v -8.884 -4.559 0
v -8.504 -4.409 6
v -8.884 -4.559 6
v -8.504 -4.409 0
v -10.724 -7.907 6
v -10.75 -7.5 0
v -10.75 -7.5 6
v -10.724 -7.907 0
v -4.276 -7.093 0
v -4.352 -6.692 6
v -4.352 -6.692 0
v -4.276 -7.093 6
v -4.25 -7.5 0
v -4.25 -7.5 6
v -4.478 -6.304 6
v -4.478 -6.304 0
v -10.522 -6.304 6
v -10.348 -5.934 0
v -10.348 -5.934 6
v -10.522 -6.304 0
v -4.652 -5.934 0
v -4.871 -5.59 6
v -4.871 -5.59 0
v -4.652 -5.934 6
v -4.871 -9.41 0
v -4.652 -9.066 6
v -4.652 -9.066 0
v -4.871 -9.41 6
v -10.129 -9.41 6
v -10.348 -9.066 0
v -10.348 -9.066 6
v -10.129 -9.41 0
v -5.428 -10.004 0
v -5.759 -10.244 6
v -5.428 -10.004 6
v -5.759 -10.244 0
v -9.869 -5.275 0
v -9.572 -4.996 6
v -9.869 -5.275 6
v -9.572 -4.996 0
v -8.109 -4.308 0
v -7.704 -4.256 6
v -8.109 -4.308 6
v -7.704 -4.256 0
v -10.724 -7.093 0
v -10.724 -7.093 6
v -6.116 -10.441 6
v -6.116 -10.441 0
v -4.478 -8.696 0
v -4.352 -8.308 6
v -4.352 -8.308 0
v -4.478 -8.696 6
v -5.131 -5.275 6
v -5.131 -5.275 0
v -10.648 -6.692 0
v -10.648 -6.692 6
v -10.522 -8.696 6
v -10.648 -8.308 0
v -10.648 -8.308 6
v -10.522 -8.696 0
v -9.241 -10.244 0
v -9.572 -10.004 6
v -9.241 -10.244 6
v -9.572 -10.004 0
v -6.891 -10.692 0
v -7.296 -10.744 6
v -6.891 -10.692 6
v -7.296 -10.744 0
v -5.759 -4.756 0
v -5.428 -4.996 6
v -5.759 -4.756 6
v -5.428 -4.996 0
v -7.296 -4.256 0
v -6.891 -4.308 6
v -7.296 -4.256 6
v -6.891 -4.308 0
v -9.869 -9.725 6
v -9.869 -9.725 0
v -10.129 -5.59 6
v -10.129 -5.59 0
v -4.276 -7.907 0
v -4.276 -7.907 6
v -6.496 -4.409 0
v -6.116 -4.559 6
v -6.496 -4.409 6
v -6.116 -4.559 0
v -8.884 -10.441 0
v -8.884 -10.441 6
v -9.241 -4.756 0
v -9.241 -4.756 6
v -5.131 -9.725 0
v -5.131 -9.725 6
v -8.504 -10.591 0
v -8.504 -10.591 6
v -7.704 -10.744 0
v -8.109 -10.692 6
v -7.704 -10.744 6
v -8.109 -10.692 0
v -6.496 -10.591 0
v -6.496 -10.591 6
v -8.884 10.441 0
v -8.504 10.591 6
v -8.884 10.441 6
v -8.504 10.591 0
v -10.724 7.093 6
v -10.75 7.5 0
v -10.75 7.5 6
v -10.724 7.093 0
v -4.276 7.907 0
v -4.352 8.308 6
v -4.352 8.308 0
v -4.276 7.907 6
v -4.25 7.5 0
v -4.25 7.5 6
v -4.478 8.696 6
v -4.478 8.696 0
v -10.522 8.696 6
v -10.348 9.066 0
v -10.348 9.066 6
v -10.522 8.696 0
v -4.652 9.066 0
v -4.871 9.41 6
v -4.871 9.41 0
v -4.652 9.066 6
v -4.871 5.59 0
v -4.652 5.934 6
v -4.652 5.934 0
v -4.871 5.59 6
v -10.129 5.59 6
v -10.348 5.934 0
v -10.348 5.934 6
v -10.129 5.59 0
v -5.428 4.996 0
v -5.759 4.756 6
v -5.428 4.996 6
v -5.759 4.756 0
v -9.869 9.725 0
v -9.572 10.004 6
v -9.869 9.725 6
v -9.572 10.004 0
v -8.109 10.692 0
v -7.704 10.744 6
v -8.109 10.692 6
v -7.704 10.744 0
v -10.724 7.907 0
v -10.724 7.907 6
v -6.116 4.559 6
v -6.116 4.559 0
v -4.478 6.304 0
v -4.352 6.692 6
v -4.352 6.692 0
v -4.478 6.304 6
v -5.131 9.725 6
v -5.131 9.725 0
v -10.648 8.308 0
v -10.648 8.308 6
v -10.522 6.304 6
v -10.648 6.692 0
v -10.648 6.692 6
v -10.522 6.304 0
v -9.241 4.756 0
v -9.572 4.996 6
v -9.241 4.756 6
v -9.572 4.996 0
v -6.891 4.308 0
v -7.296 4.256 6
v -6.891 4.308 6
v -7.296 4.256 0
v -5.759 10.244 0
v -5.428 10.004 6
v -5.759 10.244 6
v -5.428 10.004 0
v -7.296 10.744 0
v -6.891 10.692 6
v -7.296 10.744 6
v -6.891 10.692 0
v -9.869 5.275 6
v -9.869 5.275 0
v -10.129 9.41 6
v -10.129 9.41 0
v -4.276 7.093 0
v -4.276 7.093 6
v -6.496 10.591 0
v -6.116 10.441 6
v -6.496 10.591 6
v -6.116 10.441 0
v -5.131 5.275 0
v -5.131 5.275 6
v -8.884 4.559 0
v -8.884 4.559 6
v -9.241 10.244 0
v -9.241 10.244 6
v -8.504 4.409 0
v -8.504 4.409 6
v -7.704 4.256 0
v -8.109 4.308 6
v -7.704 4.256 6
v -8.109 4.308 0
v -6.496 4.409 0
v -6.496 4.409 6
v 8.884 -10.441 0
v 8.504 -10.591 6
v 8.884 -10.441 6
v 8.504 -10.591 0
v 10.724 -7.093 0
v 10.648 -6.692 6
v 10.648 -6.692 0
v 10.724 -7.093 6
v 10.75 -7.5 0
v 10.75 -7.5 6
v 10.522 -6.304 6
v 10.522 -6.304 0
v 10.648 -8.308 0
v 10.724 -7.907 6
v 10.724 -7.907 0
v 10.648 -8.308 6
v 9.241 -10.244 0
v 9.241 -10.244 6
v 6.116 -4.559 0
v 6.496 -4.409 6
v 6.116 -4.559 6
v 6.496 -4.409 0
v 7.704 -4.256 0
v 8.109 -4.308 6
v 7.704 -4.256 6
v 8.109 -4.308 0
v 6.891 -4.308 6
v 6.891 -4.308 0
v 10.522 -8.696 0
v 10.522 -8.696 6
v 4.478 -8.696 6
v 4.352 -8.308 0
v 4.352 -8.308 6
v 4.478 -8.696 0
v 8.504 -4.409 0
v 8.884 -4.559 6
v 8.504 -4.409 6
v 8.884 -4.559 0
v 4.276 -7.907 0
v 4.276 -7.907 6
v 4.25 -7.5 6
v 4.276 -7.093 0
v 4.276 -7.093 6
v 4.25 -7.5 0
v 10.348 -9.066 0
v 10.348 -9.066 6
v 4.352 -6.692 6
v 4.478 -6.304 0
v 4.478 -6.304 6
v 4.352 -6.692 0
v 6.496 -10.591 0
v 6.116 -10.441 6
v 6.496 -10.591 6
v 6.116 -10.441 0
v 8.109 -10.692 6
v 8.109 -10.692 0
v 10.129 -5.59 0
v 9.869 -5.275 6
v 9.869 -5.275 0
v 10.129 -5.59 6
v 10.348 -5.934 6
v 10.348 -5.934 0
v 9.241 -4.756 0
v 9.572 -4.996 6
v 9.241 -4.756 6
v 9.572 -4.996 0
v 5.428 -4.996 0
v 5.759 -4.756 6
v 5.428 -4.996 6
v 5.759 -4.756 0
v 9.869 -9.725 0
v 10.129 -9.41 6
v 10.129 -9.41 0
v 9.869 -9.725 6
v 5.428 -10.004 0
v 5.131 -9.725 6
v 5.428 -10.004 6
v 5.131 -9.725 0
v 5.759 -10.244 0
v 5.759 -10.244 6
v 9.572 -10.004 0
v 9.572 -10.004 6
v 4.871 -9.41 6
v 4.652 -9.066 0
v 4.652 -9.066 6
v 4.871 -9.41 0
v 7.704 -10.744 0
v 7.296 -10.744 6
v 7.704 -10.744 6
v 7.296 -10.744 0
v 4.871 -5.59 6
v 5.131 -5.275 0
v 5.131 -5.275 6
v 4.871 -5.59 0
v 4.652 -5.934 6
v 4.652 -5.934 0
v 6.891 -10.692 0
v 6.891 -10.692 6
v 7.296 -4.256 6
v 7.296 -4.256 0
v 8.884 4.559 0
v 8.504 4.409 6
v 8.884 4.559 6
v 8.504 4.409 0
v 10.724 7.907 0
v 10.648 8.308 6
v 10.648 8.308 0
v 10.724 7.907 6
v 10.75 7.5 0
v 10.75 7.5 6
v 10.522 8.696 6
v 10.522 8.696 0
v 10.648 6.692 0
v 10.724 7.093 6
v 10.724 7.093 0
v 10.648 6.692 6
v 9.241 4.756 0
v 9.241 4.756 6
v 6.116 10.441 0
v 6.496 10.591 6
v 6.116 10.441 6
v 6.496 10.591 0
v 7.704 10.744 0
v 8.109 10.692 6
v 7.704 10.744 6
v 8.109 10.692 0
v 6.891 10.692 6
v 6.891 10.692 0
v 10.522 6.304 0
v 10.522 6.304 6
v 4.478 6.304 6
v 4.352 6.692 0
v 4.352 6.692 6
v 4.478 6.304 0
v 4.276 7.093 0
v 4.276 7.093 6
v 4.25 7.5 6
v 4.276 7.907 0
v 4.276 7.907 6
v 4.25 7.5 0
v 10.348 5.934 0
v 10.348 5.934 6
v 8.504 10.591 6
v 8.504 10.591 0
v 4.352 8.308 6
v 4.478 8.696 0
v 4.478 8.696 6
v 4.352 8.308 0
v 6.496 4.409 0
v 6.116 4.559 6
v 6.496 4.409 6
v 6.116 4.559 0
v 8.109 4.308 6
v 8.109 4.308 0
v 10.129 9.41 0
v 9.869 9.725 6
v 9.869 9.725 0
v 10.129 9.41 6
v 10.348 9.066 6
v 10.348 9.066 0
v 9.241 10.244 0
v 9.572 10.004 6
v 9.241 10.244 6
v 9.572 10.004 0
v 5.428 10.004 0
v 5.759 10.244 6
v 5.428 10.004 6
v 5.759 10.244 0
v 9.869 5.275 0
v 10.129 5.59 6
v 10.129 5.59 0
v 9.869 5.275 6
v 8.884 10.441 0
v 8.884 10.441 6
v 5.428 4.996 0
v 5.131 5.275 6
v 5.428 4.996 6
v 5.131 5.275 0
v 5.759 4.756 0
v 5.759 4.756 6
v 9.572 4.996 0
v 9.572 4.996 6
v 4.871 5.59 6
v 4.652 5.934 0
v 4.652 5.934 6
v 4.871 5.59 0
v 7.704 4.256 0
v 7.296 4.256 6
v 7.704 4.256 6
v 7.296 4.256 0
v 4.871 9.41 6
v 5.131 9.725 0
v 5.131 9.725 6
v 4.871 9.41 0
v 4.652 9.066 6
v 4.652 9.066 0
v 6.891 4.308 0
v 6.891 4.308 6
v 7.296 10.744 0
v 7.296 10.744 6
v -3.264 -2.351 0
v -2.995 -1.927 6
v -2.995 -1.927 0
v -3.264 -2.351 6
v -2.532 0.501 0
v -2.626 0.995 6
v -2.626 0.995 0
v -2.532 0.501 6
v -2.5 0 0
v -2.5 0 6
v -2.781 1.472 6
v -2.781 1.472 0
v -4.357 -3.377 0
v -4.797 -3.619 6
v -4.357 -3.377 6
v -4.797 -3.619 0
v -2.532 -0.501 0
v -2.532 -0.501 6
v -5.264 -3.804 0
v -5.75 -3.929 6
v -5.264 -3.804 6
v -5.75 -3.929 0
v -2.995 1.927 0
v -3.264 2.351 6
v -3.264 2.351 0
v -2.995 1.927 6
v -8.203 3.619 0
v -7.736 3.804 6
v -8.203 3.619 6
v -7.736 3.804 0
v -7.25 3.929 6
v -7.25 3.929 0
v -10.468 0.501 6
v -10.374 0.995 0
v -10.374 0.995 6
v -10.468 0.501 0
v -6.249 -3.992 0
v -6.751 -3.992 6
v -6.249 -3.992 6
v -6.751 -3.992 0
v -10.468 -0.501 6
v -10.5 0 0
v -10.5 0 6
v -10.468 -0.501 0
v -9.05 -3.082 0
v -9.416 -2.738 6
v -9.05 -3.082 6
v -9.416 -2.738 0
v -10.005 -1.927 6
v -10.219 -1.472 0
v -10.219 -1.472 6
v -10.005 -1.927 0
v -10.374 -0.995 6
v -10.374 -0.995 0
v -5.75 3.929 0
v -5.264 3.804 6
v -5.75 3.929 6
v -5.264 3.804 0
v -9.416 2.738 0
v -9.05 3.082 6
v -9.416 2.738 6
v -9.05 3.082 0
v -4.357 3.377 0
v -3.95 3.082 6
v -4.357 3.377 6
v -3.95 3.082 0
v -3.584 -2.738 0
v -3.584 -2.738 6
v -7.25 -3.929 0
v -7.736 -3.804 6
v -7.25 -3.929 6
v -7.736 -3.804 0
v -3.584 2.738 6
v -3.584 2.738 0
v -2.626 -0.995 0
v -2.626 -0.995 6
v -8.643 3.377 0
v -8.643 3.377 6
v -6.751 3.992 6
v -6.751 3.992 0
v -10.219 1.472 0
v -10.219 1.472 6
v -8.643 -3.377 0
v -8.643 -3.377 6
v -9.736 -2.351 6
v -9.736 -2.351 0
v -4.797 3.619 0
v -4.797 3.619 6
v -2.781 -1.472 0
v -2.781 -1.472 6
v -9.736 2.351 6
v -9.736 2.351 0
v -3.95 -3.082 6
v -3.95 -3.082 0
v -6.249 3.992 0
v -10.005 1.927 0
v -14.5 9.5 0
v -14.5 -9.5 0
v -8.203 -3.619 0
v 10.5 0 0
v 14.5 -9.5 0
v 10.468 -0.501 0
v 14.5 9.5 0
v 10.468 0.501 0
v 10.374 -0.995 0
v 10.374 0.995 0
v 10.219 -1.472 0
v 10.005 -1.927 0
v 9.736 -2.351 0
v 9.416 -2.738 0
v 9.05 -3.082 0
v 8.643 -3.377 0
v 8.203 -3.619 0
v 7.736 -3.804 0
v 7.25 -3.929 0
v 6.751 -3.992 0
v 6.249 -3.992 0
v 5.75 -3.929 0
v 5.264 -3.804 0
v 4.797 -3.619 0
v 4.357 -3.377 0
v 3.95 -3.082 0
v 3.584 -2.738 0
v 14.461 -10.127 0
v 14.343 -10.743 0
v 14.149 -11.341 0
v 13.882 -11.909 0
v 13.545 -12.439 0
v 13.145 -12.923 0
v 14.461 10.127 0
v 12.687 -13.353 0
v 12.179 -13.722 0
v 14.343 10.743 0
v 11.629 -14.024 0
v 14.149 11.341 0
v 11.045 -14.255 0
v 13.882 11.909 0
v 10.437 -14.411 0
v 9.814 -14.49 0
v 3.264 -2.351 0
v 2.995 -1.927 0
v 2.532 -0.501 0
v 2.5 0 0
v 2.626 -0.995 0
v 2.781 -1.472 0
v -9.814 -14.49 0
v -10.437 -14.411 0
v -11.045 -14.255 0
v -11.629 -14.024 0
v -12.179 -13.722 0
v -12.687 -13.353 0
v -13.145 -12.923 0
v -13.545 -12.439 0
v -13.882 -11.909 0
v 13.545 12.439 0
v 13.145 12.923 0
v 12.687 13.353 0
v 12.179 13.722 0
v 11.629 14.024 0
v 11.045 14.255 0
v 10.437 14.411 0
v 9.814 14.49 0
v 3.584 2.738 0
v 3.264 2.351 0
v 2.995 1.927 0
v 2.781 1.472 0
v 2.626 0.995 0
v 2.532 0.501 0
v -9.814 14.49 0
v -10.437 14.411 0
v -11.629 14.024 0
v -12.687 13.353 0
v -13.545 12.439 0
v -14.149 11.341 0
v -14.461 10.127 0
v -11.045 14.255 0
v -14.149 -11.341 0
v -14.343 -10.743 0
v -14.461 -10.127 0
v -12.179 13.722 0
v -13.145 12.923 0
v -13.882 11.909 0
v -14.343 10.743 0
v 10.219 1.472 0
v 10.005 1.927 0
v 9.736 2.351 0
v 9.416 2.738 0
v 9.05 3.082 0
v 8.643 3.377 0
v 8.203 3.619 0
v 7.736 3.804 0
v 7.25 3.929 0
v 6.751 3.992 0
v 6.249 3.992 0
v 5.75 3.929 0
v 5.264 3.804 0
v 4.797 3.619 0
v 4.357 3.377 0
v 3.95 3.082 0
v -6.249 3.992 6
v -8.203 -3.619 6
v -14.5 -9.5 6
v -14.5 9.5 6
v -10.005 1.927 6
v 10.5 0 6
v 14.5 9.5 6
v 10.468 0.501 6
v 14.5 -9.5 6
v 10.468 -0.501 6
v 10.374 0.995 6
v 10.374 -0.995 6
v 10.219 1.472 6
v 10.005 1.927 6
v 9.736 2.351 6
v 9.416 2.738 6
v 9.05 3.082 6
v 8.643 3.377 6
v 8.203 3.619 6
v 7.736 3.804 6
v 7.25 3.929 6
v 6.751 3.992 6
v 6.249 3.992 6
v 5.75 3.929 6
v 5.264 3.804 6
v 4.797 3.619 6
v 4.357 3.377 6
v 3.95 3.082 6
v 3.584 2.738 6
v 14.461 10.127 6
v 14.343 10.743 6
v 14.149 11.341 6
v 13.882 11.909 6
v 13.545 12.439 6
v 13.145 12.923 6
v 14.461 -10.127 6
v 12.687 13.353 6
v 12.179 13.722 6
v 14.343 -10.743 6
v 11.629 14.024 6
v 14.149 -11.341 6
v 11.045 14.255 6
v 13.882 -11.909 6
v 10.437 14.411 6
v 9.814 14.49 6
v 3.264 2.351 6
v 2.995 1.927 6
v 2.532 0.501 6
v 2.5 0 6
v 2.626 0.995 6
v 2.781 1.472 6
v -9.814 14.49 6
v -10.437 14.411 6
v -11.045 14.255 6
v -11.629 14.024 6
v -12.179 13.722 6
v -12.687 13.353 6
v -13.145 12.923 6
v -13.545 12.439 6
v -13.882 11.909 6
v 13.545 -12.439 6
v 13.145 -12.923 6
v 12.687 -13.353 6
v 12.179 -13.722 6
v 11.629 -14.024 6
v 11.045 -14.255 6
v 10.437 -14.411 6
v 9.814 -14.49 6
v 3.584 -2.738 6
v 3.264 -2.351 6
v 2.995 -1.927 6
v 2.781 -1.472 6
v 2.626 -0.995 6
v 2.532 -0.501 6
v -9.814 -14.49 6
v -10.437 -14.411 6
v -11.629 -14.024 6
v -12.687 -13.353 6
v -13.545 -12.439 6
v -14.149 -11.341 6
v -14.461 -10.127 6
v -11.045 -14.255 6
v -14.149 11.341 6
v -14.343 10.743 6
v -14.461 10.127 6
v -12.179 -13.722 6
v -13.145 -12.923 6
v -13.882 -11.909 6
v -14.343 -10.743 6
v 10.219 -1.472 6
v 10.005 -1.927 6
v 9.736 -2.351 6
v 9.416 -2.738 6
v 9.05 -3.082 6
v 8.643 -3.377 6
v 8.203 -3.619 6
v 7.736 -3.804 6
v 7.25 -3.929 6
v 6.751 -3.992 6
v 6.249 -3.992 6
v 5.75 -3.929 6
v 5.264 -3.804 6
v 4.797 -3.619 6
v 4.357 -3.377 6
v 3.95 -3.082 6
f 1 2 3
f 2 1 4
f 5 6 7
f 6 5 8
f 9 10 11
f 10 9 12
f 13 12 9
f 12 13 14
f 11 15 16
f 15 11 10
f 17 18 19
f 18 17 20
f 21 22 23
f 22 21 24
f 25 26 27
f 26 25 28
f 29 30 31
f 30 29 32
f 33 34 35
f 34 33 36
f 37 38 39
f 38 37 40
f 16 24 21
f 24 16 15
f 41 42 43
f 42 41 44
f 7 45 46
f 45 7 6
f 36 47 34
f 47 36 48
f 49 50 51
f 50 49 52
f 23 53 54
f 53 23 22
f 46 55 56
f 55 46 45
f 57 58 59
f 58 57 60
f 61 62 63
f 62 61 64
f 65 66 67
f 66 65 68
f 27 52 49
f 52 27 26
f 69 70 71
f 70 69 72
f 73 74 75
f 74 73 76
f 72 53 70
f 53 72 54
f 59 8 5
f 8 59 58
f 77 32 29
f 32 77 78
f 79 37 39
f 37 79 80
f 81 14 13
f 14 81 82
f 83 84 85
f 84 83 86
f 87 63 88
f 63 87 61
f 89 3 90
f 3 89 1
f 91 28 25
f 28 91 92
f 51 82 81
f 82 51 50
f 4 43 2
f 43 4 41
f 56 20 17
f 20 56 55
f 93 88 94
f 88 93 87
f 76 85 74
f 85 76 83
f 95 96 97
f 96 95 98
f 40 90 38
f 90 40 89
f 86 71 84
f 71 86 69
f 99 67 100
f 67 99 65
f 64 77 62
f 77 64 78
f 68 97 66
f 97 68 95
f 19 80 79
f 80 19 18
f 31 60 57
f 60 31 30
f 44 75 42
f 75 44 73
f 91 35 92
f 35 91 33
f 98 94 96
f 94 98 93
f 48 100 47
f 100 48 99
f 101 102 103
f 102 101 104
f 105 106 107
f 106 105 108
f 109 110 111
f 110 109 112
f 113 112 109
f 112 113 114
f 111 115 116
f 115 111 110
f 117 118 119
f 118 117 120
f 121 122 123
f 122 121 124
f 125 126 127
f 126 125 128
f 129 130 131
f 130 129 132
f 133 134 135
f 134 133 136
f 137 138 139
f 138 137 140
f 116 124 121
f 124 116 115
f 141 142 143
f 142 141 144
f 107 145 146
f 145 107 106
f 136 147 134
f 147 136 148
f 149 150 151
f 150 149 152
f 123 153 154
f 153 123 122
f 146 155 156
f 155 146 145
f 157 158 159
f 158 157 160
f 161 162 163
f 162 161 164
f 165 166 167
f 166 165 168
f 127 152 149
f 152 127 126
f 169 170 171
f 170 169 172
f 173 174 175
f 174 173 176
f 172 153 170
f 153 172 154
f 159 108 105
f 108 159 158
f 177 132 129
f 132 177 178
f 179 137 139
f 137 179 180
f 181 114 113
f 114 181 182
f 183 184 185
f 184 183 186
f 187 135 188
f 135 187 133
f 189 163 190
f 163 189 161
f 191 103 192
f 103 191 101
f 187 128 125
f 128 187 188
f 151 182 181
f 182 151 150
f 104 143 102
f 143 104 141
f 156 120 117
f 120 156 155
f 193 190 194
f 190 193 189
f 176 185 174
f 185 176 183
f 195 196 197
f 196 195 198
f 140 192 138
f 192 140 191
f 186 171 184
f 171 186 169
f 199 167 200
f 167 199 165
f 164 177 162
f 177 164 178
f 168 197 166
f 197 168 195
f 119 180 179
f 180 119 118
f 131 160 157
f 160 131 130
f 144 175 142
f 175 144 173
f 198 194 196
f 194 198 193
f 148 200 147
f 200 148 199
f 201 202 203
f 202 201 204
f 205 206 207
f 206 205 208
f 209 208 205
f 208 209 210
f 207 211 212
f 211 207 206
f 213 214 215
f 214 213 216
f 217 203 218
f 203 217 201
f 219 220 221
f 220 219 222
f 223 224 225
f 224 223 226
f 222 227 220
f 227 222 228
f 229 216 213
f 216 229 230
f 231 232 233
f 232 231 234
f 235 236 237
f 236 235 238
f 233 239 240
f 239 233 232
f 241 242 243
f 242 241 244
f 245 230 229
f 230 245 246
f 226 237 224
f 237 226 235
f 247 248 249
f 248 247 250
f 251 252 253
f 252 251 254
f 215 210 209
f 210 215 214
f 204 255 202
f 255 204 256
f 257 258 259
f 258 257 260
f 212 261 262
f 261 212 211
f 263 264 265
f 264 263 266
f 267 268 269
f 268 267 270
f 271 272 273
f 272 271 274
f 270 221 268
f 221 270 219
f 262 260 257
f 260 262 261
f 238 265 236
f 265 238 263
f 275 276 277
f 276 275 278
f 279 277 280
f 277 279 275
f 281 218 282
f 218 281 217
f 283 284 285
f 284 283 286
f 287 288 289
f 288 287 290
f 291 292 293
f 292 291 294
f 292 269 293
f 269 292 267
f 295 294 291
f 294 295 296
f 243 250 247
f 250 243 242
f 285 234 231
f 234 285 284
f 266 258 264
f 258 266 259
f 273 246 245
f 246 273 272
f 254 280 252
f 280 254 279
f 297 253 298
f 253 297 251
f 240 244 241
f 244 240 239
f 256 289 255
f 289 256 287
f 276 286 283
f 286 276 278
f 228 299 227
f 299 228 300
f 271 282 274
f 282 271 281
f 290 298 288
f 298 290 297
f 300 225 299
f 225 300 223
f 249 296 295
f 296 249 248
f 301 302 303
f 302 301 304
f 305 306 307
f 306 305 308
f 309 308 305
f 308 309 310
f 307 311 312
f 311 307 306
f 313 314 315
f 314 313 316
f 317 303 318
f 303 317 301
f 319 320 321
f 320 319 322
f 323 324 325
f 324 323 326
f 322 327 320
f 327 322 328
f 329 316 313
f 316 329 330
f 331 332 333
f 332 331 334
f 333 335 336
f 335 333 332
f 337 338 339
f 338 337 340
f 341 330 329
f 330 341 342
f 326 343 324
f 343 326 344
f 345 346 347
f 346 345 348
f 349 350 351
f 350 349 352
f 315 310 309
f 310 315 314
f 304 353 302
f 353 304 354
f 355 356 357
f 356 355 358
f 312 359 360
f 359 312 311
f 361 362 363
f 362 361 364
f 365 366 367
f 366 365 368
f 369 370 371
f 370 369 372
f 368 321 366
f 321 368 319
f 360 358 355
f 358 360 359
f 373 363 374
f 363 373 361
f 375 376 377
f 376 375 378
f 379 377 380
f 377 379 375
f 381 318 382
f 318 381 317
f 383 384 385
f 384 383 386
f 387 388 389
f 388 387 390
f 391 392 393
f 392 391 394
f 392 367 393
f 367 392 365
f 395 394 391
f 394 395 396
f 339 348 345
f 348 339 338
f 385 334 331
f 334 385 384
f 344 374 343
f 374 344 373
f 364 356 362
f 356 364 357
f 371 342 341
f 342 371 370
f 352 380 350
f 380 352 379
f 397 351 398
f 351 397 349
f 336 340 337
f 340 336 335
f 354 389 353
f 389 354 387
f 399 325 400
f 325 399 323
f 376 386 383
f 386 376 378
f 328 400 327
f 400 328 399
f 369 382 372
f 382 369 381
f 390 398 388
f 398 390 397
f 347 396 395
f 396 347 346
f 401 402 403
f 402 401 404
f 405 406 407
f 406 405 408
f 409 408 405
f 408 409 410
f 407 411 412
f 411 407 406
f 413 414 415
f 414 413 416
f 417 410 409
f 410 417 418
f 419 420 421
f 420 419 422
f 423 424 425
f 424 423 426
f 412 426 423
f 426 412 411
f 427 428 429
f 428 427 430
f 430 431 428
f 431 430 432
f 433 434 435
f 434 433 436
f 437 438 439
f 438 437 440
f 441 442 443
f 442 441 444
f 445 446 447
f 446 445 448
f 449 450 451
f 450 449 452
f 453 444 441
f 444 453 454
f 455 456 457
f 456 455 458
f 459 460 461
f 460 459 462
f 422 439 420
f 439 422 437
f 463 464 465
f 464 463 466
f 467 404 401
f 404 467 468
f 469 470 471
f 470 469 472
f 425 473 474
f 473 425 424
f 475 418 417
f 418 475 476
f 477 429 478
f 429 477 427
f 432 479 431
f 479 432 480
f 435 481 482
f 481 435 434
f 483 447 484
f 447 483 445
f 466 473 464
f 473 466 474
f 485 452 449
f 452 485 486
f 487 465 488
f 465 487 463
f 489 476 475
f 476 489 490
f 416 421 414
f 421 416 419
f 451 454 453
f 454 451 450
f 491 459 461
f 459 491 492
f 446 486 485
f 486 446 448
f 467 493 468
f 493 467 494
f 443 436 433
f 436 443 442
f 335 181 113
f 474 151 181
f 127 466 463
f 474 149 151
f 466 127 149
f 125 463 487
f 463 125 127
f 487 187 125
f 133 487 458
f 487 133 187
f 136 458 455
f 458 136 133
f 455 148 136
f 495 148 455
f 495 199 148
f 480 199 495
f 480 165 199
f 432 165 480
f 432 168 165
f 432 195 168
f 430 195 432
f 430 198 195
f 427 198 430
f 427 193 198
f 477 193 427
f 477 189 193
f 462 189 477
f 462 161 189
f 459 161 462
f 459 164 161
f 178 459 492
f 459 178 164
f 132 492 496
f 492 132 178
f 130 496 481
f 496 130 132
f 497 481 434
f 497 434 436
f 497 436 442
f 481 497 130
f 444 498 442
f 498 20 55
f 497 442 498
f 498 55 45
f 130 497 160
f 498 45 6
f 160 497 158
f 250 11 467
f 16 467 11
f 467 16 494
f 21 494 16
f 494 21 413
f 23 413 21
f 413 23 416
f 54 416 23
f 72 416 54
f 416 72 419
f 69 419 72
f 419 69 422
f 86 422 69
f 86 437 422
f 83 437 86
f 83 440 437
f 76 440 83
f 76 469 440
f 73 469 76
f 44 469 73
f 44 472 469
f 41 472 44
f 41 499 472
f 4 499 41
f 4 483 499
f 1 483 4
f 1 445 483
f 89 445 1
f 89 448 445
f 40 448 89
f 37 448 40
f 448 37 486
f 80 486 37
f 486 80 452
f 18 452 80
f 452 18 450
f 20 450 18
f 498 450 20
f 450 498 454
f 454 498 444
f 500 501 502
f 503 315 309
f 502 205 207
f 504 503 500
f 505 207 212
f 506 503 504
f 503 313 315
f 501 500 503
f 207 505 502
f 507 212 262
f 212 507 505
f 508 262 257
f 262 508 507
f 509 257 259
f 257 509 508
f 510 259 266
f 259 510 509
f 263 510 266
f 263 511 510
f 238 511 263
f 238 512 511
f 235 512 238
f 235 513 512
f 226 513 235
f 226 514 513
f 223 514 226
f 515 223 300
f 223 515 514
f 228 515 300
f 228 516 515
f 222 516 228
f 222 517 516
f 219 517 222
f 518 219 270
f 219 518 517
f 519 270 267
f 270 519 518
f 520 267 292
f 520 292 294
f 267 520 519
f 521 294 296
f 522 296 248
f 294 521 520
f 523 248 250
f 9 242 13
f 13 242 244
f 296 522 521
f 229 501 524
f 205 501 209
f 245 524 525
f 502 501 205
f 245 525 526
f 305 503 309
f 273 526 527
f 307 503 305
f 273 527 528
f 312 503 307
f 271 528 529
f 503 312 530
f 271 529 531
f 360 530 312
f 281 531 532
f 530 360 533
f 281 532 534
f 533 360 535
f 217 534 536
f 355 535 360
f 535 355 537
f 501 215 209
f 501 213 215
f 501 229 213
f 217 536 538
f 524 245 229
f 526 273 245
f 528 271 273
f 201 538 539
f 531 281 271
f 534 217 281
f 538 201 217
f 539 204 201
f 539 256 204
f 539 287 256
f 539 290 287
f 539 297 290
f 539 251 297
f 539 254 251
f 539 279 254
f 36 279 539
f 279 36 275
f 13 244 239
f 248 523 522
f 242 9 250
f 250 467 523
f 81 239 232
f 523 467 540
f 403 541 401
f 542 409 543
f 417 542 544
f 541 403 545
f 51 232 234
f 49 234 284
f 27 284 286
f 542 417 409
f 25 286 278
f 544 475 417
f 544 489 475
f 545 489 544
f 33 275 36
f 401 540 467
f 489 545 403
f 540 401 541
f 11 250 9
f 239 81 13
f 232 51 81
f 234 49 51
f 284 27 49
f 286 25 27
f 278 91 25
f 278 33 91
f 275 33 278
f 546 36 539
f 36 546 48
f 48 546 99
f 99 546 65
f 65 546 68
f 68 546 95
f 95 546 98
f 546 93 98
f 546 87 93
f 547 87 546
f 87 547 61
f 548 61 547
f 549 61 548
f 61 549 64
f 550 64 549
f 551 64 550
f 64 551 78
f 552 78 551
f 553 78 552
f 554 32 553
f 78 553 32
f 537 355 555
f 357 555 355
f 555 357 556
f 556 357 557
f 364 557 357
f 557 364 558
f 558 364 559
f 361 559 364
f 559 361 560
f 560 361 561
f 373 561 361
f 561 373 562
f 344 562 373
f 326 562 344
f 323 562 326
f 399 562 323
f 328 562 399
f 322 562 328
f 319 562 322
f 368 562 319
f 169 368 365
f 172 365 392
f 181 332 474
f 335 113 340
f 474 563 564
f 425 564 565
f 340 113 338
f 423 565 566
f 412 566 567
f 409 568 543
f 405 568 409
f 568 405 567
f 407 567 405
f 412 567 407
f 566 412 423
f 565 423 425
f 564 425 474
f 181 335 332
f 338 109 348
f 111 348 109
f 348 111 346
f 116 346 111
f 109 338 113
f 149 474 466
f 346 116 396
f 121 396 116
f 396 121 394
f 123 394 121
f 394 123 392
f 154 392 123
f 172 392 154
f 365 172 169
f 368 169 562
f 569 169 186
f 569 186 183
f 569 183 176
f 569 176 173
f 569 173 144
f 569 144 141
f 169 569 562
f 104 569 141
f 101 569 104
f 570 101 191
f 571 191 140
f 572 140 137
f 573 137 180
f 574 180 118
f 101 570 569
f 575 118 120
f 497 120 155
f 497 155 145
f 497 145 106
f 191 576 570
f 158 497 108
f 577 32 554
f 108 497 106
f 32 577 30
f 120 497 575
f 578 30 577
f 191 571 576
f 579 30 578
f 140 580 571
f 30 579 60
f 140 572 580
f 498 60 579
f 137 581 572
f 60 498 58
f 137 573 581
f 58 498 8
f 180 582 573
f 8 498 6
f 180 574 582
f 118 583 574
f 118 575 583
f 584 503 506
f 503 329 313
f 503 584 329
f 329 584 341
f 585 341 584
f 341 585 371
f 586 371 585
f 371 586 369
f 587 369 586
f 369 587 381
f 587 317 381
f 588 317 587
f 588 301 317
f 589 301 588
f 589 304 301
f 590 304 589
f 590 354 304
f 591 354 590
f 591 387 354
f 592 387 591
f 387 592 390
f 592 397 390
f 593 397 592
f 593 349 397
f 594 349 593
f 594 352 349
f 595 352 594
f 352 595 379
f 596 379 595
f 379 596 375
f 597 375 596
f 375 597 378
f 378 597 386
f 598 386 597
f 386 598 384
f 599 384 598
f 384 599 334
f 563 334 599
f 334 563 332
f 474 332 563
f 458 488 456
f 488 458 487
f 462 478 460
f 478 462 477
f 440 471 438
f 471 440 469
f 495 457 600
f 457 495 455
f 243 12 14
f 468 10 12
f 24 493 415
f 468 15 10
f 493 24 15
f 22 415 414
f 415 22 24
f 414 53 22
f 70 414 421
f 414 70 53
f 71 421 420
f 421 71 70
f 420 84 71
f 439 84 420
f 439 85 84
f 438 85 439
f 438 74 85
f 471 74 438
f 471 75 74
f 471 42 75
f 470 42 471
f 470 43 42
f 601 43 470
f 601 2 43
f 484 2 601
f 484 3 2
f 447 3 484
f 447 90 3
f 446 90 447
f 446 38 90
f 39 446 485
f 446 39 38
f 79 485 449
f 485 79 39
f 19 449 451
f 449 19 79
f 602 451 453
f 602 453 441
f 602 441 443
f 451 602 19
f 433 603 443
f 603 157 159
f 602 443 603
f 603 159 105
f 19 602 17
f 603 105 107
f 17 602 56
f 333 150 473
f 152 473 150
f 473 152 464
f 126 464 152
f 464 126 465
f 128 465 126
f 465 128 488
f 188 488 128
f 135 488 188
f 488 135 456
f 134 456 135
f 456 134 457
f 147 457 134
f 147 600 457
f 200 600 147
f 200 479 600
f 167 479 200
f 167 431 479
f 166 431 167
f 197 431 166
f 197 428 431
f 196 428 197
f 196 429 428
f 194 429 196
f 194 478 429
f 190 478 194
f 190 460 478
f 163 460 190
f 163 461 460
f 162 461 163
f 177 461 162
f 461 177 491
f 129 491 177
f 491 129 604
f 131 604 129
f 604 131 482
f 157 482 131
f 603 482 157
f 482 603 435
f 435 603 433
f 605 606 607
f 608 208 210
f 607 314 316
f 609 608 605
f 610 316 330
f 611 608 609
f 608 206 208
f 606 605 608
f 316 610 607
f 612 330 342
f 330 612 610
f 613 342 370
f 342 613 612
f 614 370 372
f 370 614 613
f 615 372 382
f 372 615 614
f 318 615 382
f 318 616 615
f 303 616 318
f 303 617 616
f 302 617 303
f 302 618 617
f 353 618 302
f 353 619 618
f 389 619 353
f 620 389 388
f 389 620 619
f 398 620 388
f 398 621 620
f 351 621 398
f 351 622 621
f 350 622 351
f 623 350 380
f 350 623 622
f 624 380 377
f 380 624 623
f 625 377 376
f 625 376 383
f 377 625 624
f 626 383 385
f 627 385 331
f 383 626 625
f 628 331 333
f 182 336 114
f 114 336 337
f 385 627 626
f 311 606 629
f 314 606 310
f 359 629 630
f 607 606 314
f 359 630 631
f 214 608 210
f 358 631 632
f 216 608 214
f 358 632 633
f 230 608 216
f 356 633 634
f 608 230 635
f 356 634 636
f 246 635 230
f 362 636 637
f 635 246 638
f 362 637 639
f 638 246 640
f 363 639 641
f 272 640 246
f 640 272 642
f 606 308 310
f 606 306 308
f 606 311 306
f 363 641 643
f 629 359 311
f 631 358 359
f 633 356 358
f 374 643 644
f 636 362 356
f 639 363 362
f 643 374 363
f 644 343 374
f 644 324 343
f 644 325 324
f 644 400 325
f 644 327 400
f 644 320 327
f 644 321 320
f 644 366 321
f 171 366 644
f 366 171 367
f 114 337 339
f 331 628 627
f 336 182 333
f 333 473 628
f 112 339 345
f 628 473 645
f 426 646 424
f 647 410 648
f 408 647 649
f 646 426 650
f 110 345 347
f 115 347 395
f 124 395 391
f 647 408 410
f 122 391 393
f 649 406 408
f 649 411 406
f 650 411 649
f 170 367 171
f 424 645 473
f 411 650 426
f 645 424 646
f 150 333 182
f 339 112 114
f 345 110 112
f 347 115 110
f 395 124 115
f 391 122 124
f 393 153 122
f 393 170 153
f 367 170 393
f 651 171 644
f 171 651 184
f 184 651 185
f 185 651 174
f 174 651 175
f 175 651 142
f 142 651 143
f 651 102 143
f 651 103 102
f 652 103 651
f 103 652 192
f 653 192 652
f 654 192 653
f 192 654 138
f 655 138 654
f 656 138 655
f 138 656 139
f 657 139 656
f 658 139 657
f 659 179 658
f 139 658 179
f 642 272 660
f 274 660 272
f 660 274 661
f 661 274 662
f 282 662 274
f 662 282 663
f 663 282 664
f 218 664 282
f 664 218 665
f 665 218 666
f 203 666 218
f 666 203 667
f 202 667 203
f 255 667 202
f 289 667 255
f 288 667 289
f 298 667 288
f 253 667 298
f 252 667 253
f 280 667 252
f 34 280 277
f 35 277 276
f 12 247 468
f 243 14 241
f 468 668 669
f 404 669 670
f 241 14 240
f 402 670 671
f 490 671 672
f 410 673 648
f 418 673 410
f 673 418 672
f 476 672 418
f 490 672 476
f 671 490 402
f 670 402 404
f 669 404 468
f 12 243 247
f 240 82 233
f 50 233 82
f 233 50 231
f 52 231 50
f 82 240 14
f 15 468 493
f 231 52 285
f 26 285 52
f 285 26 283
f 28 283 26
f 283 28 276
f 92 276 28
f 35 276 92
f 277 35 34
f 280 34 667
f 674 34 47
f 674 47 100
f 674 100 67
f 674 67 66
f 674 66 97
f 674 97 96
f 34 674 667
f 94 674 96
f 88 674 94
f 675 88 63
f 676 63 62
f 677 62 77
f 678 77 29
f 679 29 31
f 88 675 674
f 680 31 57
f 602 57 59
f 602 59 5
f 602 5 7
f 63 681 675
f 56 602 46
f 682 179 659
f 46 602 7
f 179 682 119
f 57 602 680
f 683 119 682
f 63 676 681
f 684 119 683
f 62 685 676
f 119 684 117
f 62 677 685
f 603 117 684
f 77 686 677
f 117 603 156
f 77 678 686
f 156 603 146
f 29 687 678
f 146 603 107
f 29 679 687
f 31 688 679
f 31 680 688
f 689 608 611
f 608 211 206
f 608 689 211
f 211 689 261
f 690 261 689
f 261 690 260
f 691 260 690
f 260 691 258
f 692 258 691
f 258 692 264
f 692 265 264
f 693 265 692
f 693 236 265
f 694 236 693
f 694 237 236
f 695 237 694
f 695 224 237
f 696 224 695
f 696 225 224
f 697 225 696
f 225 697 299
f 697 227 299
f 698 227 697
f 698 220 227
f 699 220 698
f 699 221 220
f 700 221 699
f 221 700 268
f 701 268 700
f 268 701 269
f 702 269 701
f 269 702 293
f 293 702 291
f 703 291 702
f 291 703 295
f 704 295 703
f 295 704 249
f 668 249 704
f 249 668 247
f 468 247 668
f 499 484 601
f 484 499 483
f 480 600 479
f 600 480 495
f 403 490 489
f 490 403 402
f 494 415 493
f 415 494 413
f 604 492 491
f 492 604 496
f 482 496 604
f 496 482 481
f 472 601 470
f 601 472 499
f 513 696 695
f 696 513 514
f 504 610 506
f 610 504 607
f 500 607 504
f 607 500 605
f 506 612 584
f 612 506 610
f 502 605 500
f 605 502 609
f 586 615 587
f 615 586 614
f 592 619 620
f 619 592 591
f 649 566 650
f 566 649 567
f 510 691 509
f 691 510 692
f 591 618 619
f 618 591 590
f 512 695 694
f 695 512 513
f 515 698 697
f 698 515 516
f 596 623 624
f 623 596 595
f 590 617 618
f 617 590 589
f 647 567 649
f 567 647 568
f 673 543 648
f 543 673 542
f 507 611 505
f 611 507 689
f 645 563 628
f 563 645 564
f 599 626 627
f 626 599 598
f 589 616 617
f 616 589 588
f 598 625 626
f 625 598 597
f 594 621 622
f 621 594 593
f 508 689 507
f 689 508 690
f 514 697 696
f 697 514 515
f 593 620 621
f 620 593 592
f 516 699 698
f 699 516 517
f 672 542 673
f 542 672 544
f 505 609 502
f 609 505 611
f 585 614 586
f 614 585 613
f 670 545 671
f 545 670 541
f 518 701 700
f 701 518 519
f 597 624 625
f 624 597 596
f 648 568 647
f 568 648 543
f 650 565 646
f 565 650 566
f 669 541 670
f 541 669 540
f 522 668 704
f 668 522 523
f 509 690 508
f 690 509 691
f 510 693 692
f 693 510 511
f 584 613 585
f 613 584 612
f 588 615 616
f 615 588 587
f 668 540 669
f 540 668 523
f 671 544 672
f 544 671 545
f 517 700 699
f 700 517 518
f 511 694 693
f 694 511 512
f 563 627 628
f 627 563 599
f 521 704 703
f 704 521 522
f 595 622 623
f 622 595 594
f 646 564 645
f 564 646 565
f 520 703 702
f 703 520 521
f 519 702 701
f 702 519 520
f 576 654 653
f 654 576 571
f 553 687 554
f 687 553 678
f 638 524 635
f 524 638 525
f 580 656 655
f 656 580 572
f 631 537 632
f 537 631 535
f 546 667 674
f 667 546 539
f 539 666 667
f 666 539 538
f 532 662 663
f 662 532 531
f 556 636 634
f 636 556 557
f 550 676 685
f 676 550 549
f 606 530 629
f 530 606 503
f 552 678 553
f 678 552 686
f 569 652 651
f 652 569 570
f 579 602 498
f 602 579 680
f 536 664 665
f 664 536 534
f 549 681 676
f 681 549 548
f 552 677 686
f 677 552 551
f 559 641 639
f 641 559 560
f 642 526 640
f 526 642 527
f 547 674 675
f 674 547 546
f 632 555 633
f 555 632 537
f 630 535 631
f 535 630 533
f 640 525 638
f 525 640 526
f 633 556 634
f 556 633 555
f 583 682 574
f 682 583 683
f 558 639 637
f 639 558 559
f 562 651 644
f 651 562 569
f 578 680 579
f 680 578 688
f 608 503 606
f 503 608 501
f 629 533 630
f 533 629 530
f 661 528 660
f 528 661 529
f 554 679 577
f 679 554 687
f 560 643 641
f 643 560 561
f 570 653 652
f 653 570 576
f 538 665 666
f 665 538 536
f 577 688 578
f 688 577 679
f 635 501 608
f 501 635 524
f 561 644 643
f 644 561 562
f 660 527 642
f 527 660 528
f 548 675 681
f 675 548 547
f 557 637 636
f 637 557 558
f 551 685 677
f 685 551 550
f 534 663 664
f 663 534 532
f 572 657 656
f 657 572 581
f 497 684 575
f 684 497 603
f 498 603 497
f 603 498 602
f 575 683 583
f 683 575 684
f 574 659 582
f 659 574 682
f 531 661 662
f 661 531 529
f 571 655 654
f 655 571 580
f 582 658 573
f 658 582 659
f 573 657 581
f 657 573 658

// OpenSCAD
$fn = 50;


difference() {
	union() {
		hull() {
			translate(v = [-9.5000000000, 9.5000000000, 0]) {
				cylinder(h = 6, r = 5);
			}
			translate(v = [9.5000000000, 9.5000000000, 0]) {
				cylinder(h = 6, r = 5);
			}
			translate(v = [-9.5000000000, -9.5000000000, 0]) {
				cylinder(h = 6, r = 5);
			}
			translate(v = [9.5000000000, -9.5000000000, 0]) {
				cylinder(h = 6, r = 5);
			}
		}
	}
	union() {
		#translate(v = [-7.5000000000, -7.5000000000, -100.0000000000]) {
			cylinder(h = 200, r = 3.2500000000);
		}
		#translate(v = [-7.5000000000, 7.5000000000, -100.0000000000]) {
			cylinder(h = 200, r = 3.2500000000);
		}
		#translate(v = [7.5000000000, -7.5000000000, -100.0000000000]) {
			cylinder(h = 200, r = 3.2500000000);
		}
		#translate(v = [7.5000000000, 7.5000000000, -100.0000000000]) {
			cylinder(h = 200, r = 3.2500000000);
		}
		#translate(v = [-6.5000000000, 0, 0]) {
			cylinder(h = 6, r = 4.0000000000);
		}
		#translate(v = [6.5000000000, 0, 0]) {
			cylinder(h = 6, r = 4.0000000000);
		}
	}
}
